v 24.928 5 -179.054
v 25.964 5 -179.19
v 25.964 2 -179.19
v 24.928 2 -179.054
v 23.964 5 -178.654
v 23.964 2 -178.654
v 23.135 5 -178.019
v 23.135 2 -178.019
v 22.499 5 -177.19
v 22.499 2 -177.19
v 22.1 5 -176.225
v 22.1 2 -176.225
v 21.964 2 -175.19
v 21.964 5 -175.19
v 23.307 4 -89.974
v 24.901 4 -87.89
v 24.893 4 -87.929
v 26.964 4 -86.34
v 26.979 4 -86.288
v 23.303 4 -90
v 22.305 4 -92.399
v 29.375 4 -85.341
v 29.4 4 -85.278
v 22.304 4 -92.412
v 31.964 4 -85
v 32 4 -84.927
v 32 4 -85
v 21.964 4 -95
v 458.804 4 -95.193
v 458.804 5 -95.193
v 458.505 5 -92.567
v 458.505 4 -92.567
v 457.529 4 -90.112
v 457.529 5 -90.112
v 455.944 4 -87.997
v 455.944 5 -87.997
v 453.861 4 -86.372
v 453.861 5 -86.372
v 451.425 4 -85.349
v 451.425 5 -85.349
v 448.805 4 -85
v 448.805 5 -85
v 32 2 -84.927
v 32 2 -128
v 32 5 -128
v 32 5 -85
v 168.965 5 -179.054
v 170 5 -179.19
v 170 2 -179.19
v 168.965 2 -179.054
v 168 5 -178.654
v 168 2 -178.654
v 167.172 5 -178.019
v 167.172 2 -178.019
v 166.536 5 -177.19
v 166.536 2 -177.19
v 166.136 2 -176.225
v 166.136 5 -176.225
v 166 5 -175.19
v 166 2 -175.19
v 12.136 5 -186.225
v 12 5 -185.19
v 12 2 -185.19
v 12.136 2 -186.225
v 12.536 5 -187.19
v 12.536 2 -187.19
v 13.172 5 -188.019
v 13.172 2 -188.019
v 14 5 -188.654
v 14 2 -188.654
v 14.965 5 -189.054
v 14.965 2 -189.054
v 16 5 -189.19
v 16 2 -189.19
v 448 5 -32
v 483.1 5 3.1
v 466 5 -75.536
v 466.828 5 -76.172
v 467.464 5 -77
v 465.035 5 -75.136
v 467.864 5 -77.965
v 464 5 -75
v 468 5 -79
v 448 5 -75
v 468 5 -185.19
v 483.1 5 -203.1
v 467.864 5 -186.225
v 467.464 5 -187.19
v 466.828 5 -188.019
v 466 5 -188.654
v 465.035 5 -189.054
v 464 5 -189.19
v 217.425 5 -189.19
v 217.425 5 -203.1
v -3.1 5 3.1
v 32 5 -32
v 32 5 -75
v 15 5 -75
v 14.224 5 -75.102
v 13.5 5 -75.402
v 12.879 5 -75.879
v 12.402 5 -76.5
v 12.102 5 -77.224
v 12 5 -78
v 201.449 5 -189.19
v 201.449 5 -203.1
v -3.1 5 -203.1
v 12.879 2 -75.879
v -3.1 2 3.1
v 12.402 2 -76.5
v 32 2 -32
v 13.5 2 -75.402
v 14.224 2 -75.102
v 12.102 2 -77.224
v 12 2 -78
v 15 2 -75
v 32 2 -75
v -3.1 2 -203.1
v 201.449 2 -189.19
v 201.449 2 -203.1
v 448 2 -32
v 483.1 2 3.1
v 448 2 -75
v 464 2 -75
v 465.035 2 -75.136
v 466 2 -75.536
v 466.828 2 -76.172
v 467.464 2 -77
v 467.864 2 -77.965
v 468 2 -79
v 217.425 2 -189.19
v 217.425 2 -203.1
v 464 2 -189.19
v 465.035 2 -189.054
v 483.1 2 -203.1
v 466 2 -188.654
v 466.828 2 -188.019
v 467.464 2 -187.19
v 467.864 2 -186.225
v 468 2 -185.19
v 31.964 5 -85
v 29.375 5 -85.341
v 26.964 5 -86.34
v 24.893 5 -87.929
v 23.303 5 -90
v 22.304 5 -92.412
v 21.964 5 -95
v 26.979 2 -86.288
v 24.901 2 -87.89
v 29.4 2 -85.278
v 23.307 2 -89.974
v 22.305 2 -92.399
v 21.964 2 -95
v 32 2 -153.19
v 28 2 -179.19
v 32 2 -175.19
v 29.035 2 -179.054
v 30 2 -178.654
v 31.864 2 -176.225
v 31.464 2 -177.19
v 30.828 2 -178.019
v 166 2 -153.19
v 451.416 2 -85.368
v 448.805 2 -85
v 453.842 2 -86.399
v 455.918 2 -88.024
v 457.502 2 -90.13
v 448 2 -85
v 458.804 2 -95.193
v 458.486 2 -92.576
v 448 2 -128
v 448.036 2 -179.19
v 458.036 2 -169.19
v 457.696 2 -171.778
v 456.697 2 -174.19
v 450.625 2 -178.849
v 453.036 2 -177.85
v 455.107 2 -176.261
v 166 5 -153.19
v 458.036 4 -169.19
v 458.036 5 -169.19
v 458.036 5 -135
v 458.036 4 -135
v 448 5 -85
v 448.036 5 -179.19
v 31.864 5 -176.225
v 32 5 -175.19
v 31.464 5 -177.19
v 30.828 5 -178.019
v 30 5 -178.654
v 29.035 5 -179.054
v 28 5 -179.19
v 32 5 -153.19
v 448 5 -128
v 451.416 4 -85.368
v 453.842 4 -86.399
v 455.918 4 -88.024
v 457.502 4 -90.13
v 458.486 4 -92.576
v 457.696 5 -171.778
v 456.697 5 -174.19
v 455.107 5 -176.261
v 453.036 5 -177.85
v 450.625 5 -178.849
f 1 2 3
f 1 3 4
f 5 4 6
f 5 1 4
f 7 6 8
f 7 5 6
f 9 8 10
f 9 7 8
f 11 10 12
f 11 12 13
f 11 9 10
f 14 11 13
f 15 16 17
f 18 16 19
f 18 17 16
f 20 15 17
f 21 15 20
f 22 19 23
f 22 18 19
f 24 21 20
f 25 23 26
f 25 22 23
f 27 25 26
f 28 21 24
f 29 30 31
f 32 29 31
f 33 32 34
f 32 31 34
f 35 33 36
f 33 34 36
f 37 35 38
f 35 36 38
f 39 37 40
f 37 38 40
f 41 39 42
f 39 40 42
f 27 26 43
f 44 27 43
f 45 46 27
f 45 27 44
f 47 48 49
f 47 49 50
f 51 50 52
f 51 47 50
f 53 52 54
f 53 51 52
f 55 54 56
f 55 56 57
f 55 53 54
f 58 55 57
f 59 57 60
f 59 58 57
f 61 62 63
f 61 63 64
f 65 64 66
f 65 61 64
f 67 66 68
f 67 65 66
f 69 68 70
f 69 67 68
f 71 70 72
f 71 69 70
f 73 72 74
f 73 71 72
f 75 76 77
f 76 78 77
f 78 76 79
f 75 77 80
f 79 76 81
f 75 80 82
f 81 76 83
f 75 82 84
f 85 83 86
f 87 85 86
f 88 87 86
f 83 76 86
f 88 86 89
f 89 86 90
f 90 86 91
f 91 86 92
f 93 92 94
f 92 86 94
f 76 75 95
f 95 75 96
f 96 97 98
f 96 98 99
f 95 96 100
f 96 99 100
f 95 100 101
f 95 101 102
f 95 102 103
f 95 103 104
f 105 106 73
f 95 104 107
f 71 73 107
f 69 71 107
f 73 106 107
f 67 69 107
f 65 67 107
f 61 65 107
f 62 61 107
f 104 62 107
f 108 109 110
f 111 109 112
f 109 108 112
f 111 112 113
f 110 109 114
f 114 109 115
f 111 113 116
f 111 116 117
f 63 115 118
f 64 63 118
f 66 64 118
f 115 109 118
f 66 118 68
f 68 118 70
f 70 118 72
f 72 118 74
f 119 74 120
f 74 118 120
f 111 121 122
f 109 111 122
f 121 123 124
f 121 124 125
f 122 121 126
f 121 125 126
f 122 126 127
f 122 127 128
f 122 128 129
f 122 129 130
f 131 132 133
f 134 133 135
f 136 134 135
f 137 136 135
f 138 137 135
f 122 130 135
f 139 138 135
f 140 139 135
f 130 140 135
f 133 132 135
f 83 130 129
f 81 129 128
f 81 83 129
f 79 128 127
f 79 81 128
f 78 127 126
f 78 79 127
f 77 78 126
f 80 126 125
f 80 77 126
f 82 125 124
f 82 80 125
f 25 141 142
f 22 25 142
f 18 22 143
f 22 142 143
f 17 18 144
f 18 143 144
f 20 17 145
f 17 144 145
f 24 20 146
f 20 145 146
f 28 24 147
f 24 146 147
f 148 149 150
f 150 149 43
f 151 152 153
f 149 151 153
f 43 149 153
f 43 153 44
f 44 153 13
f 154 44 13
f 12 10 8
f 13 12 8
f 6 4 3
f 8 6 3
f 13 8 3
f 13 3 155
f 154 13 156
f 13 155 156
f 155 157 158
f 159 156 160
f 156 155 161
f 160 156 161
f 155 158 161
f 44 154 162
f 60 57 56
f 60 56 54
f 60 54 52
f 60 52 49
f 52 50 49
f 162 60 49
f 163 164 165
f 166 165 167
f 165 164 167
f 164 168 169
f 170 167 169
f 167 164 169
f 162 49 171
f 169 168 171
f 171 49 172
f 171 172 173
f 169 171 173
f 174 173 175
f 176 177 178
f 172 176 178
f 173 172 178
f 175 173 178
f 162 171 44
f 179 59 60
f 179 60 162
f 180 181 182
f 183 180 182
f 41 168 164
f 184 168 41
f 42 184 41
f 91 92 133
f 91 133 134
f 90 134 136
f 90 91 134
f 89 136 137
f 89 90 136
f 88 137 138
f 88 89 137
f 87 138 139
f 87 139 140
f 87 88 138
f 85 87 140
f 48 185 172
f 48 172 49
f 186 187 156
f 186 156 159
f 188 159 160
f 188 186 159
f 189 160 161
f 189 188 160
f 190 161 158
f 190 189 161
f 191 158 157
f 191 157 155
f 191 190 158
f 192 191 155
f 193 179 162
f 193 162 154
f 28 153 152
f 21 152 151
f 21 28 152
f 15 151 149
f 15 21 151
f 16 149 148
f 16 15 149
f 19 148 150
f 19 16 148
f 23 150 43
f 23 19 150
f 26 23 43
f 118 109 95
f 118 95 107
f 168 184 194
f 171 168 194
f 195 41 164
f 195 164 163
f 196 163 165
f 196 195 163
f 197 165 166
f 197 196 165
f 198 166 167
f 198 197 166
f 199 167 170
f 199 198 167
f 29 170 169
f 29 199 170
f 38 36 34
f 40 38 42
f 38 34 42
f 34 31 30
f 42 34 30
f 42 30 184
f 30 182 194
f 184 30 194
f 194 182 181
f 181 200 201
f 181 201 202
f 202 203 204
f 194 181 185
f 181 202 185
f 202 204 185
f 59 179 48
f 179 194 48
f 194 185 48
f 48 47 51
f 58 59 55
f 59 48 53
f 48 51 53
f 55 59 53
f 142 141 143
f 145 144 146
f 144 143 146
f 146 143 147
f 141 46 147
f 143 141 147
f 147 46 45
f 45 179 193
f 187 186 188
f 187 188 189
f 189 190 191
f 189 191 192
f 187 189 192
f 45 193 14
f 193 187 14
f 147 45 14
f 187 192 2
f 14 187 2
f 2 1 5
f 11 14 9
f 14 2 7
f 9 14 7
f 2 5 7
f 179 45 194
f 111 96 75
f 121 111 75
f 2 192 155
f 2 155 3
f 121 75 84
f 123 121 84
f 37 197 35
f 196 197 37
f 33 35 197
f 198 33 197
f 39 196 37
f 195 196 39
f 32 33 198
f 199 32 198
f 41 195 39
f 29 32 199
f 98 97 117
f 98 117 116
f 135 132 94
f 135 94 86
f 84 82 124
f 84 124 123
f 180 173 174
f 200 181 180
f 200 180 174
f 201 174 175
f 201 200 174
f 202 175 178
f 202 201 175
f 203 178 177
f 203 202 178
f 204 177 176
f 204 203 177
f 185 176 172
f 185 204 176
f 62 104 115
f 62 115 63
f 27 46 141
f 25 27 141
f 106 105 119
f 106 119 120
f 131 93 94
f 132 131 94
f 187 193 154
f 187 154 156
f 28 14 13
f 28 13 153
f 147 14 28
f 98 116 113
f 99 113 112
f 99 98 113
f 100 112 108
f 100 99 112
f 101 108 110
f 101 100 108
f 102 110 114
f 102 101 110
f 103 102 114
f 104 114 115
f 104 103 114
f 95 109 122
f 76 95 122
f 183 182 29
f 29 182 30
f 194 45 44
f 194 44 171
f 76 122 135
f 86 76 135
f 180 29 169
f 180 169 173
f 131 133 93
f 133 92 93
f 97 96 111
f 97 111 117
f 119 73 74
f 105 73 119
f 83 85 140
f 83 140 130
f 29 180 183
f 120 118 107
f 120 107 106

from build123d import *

# Parameters (mm, degrees)
CROQUIS1_W              = 486.2
CROQUIS1_H              = 206.2
CROQUIS1_W_2            = 480
CROQUIS1_H_2            = 200
SALIENTE_EXTRUIR1_DEPTH = 12
CROQUIS3_W              = 486.2
CROQUIS3_H              = 206.2
CROQUIS3_W_2            = 480
CROQUIS3_H_2            = 200
CORTAR_EXTRUIR1_DEPTH   = 5
CORTAR_EXTRUIR3_DEPTH   = 8
CROQUIS4_W              = 20
CROQUIS4_H              = 6
CORTAR_EXTRUIR4_DEPTH   = 3
CORTAR_EXTRUIR5_DEPTH   = 2
CROQUIS7_W              = 721.947089947
CROQUIS7_H              = 359.419856831
CORTAR_EXTRUIR6_DEPTH   = 10
CROQUIS8_W              = 416
CROQUIS8_H              = 96
CORTAR_EXTRUIR7_DEPTH   = 10
CROQUIS9_W              = 531.904745737
CROQUIS9_H              = 246.353411826
CORTAR_EXTRUIR9_DEPTH   = 10
CROQUIS10_W             = 531.904745737
CROQUIS10_H             = 246.353411826
CORTAR_EXTRUIR10_DEPTH  = 10
CROQUIS11_W             = 531.904745737
CROQUIS11_H             = 246.353411826
CORTAR_EXTRUIR11_DEPTH  = 10


with BuildPart() as part:
    # Croquis1 → Saliente-Extruir1 (new body)
    with BuildSketch(Plane(origin=(0, 0, 0), x_dir=(1, 0, 0), z_dir=(0, 1, 0))):
        with Locations((240, 100)):
            Rectangle(CROQUIS1_W, CROQUIS1_H)
        with Locations((240, 100)):
            Rectangle(CROQUIS1_W_2, CROQUIS1_H_2, mode=Mode.SUBTRACT)
        with Locations((240, 100)):
            Rectangle(CROQUIS1_W_2, CROQUIS1_H_2)
    extrude(amount=SALIENTE_EXTRUIR1_DEPTH)

    # Croquis3 → Cortar-Extruir1 (cut)
    with BuildSketch(Plane(origin=(0, 12, 0), x_dir=(1, 0, 0), z_dir=(0, 1, 0))):
        with Locations((240, 100)):
            Rectangle(CROQUIS3_W, CROQUIS3_H)
        with Locations((240, 100)):
            Rectangle(CROQUIS3_W_2, CROQUIS3_H_2, mode=Mode.SUBTRACT)
    extrude(amount=-CORTAR_EXTRUIR1_DEPTH, mode=Mode.SUBTRACT)

    # Croquis2 → Cortar-Extruir3 (cut)
    with BuildSketch(Plane(origin=(0, 12, 0), x_dir=(1, 0, 0), z_dir=(0, 1, 0))):
        with BuildLine():
            ThreePointArc((16, 189.1902066), (13.171572875, 188.018633725), (12, 185.1902066))
            Line((12, 185.1902066), (12, 78))
            ThreePointArc((12, 78), (12.878679656, 75.878679656), (15, 75))
            Line((15, 75), (32, 75))
            Line((32, 75), (32, 32))
            Line((32, 32), (448, 32))
            Line((448, 32), (448, 75))
            Line((448, 75), (464, 75))
            ThreePointArc((464, 75), (466.828427125, 76.171572875), (468, 79))
            Line((468, 79), (468, 185.1902066))
            ThreePointArc((468, 185.1902066), (466.828427125, 188.018633725), (464, 189.1902066))
            Line((464, 189.1902066), (217.424703227, 189.1902066))
            Line((217.424703227, 189.1902066), (217.424703227, 203.1))
            Line((217.424703227, 203.1), (201.44869327, 203.1))
            Line((201.44869327, 203.1), (201.44869327, 189.1902066))
            Line((201.44869327, 189.1902066), (16, 189.1902066))
        make_face()
        with BuildLine():
            Line((32, 85), (31.963588191, 85))
            ThreePointArc((31.963588191, 85), (24.892520379, 87.928932188), (21.963588191, 95))
            Line((21.963588191, 95), (21.963588191, 175.1902066))
            ThreePointArc((21.963588191, 175.1902066), (23.135161066, 178.018633725), (25.963588191, 179.1902066))
            Line((25.963588191, 179.1902066), (28, 179.1902066))
            ThreePointArc((28, 179.1902066), (30.828427125, 178.018633725), (32, 175.1902066))
            Line((32, 175.1902066), (32, 153.1902066))
            Line((32, 153.1902066), (166, 153.1902066))
            Line((166, 153.1902066), (166, 175.1902066))
            ThreePointArc((166, 175.1902066), (167.171572875, 178.018633725), (170, 179.1902066))
            Line((170, 179.1902066), (448.036411809, 179.1902066))
            ThreePointArc((448.036411809, 179.1902066), (455.107479621, 176.261274412), (458.036411809, 169.1902066))
            Line((458.036411809, 169.1902066), (458.036411809, 135.000000034))
            Line((458.036411809, 135.000000034), (458.803569043, 95.19268186))
            ThreePointArc((458.803569043, 95.19268186), (455.944291637, 87.997386866), (448.80542553, 85))
            Line((448.80542553, 85), (448, 85))
            Line((448, 85), (448, 128))
            Line((448, 128), (32, 128))
            Line((32, 128), (32, 85))
        make_face(mode=Mode.SUBTRACT)
    extrude(amount=-CORTAR_EXTRUIR3_DEPTH, mode=Mode.SUBTRACT)

    # Croquis4 → Cortar-Extruir4 (cut)
    with BuildSketch(Plane(origin=(0, 12, 0), x_dir=(1, 0, 0), z_dir=(0, 1, 0))):
        with BuildLine():
            Line((31.963588191, 85), (32, 128))
            Line((32, 128), (32, 134))
            Line((32, 134), (32, 147.1902066))
            Line((32, 147.1902066), (32, 153.1902066))
            Line((32, 153.1902066), (32, 175.1902066))
            ThreePointArc((32, 175.1902066), (30.828427125, 178.018633725), (28, 179.1902066))
            Line((28, 179.1902066), (25.963588191, 179.1902066))
            ThreePointArc((25.963588191, 179.1902066), (23.135161066, 178.018633725), (21.963588191, 175.1902066))
            Line((21.963588191, 175.1902066), (21.963588191, 95))
            ThreePointArc((21.963588191, 95), (24.892520379, 87.928932188), (31.963588191, 85))
        make_face()
        with Locations((42, 131)):
            Rectangle(CROQUIS4_W, CROQUIS4_H)
        with Locations((42, 150.1902066)):
            Rectangle(CROQUIS4_W, CROQUIS4_H)
        with BuildLine():
            ThreePointArc((12, 78), (12.878679656, 75.878679656), (15, 75))
            Line((15, 75), (32, 75))
            Line((32, 75), (32, 69))
            Line((32, 69), (6, 69))
            Line((6, 69), (6, 80))
            Line((6, 80), (6, 195.1902066))
            Line((6, 195.1902066), (16, 195.1902066))
            Line((16, 195.1902066), (32, 195.1902066))
            Line((32, 195.1902066), (32, 189.1902066))
            Line((32, 189.1902066), (16, 189.1902066))
            ThreePointArc((16, 189.1902066), (13.171572875, 188.018633725), (12, 185.1902066))
            Line((12, 185.1902066), (12, 80))
            Line((12, 80), (12, 78))
        make_face()
        with Locations((42, 192.1902066)):
            Rectangle(CROQUIS4_W, CROQUIS4_H)
        with Locations((42, 29)):
            Rectangle(CROQUIS4_W, CROQUIS4_H)
        with Locations((156, 192.1902066)):
            Rectangle(CROQUIS4_W, CROQUIS4_H)
        with Locations((156, 150.1902066)):
            Rectangle(CROQUIS4_W, CROQUIS4_H)
        with BuildLine():
            Line((166, 147.1902066), (448, 147.1902066))
            Line((448, 147.1902066), (458.036411809, 147.1902066))
            Line((458.036411809, 147.1902066), (458.036411809, 169.1902066))
            ThreePointArc((458.036411809, 169.1902066), (455.107479621, 176.261274412), (448.036411809, 179.1902066))
            Line((448.036411809, 179.1902066), (170, 179.1902066))
            ThreePointArc((170, 179.1902066), (167.171572875, 178.018633725), (166, 175.1902066))
            Line((166, 175.1902066), (166, 153.1902066))
            Line((166, 153.1902066), (166, 147.1902066))
        make_face()
        with BuildLine():
            Line((458.036411809, 169.1902066), (458.036411809, 147.1902066))
            Line((458.036411809, 147.1902066), (474, 147.1902066))
            Line((474, 147.1902066), (474, 195.1902066))
            Line((474, 195.1902066), (166, 195.1902066))
            Line((166, 195.1902066), (166, 189.1902066))
            Line((166, 189.1902066), (166, 175.1902066))
            ThreePointArc((166, 175.1902066), (167.171572875, 178.018633725), (170, 179.1902066))
            Line((170, 179.1902066), (448.036411809, 179.1902066))
            ThreePointArc((448.036411809, 179.1902066), (455.107479621, 176.261274412), (458.036411809, 169.1902066))
        make_face()
        with BuildLine():
            Line((448.80542553, 85), (448, 85))
            Line((448, 85), (448, 69))
            Line((448, 69), (474, 69))
            Line((474, 69), (474, 147.1902066))
            Line((474, 147.1902066), (458.036411809, 147.1902066))
            Line((458.036411809, 147.1902066), (458.036411809, 135.000000034))
            Line((458.036411809, 135.000000034), (458.803569043, 95.19268186))
            ThreePointArc((458.803569043, 95.19268186), (455.944291637, 87.997386866), (448.80542553, 85))
        make_face()
        with Locations((438, 131)):
            Rectangle(CROQUIS4_W, CROQUIS4_H)
        with Locations((438, 29)):
            Rectangle(CROQUIS4_W, CROQUIS4_H)
        with BuildLine():
            Line((448, 134), (448, 128))
            Line((448, 128), (448, 85))
            Line((448, 85), (448.80542553, 85))
            ThreePointArc((448.80542553, 85), (455.944291637, 87.997386866), (458.803569043, 95.19268186))
            Line((458.803569043, 95.19268186), (458.036411809, 135.000000034))
            Line((458.036411809, 135.000000034), (458.036411809, 147.1902066))
            Line((458.036411809, 147.1902066), (448, 147.1902066))
            Line((448, 147.1902066), (448, 134))
        make_face()
    extrude(amount=-CORTAR_EXTRUIR4_DEPTH, mode=Mode.SUBTRACT)

    # Croquis5 → Cortar-Extruir5 (cut)
    with BuildSketch(Plane(origin=(0, 4, 0), x_dir=(1, 0, 0), z_dir=(0, 1, 0))):
        with BuildLine():
            Line((32.046028397, 84.926485337), (32, 75))
            Line((32, 75), (15, 75))
            ThreePointArc((15, 75), (12.878679656, 75.878679656), (12, 78))
            Line((12, 78), (12, 185.1902066))
            ThreePointArc((12, 185.1902066), (13.171572875, 188.018633725), (16, 189.1902066))
            Line((16, 189.1902066), (201.44869327, 189.1902066))
            Line((201.44869327, 189.1902066), (201.44869327, 203.1))
            Line((201.44869327, 203.1), (217.424703227, 203.1))
            Line((217.424703227, 203.1), (217.424703227, 189.1902066))
            Line((217.424703227, 189.1902066), (464, 189.1902066))
            ThreePointArc((464, 189.1902066), (466.828427125, 188.018633725), (468, 185.1902066))
            Line((468, 185.1902066), (468, 79))
            ThreePointArc((468, 79), (466.828427125, 76.171572875), (464, 75))
            Line((464, 75), (448, 75))
            Line((448, 75), (448, 85))
            Line((448, 85), (448.80542553, 85))
            ThreePointArc((448.80542553, 85), (455.917657262, 88.023512896), (458.803569043, 95.19268186))
            Line((458.803569043, 95.19268186), (458.036411809, 169.1902066))
            ThreePointArc((458.036411809, 169.1902066), (455.107479621, 176.261274412), (448.036411809, 179.1902066))
            Line((448.036411809, 179.1902066), (170, 179.1902066))
            ThreePointArc((170, 179.1902066), (167.171572875, 178.018633725), (166, 175.1902066))
            Line((166, 175.1902066), (166, 153.1902066))
            Line((166, 153.1902066), (32, 153.1902066))
            Line((32, 153.1902066), (32, 175.1902066))
            ThreePointArc((32, 175.1902066), (30.828427125, 178.018633725), (28, 179.1902066))
            Line((28, 179.1902066), (25.963588191, 179.1902066))
            ThreePointArc((25.963588191, 179.1902066), (23.135161066, 178.018633725), (21.963588191, 175.1902066))
            Line((21.963588191, 175.1902066), (21.963588191, 95))
            ThreePointArc((21.963588191, 95), (24.91720844, 87.873793117), (32.046028397, 84.926485337))
        make_face()
    extrude(amount=-CORTAR_EXTRUIR5_DEPTH, mode=Mode.SUBTRACT)

    # Croquis7 → Cortar-Extruir6 (cut)
    with BuildSketch(Plane(origin=(0, 2, 0), x_dir=(1, 0, 0), z_dir=(0, 1, 0))):
        with Locations((149.368191722, 161.470369199)):
            Rectangle(CROQUIS7_W, CROQUIS7_H)
    extrude(amount=-CORTAR_EXTRUIR6_DEPTH, mode=Mode.SUBTRACT)

    # Croquis8 → Cortar-Extruir7 (cut)
    with BuildSketch(Plane(origin=(0, 4, 0), x_dir=(1, 0, 0), z_dir=(0, 1, 0))):
        with Locations((240, 80)):
            Rectangle(CROQUIS8_W, CROQUIS8_H)
    extrude(amount=-CORTAR_EXTRUIR7_DEPTH, mode=Mode.SUBTRACT)


with BuildPart() as cortar_extruir7_piece_1:
    # of the separate pieces the step leaves, piece 1, a body of its own (cortar_extruir7_pieces)
    add(part.part.solids().sort_by_distance((483.1, 2, 3.1))[0])


with BuildPart() as cortar_extruir7_piece_2:
    # of the separate pieces the step leaves, piece 2, a body of its own (cortar_extruir7_pieces)
    add(part.part.solids().sort_by_distance((32, 2, -128))[0])


with BuildPart() as cortar_extruir9_tool:
    # Croquis9 → Cortar-Extruir9 (new body)
    with BuildSketch(Plane(origin=(0, 9, 0), x_dir=(1, 0, 0), z_dir=(0, 1, 0))):
        with Locations((247.004349215, 106.418772052)):
            Rectangle(CROQUIS9_W, CROQUIS9_H)
    extrude(amount=CORTAR_EXTRUIR9_DEPTH)


with BuildPart() as cortar_extruir7_piece_1_1:
    add(cortar_extruir7_piece_1.part)

    # Cortar-Extruir9: cut by cortar_extruir9_tool
    add(cortar_extruir9_tool.part, mode=Mode.SUBTRACT)


with BuildPart() as cortar_extruir7_piece_2_1:
    add(cortar_extruir7_piece_2.part)

    # Cortar-Extruir9: cut by cortar_extruir9_tool
    add(cortar_extruir9_tool.part, mode=Mode.SUBTRACT)


with BuildPart() as cortar_extruir10_tool:
    # Croquis10 → Cortar-Extruir10 (new body)
    with BuildSketch(Plane(origin=(0, 7, 0), x_dir=(1, 0, 0), z_dir=(0, 1, 0))):
        with Locations((247.004349215, 106.418772052)):
            Rectangle(CROQUIS10_W, CROQUIS10_H)
    extrude(amount=CORTAR_EXTRUIR10_DEPTH)


with BuildPart() as cortar_extruir7_piece_1_2:
    add(cortar_extruir7_piece_1_1.part)

    # Cortar-Extruir10: cut by cortar_extruir10_tool
    add(cortar_extruir10_tool.part, mode=Mode.SUBTRACT)


with BuildPart() as cortar_extruir7_piece_2_2:
    add(cortar_extruir7_piece_2_1.part)

    # Cortar-Extruir10: cut by cortar_extruir10_tool
    add(cortar_extruir10_tool.part, mode=Mode.SUBTRACT)


with BuildPart() as cortar_extruir11_tool:
    # Croquis11 → Cortar-Extruir11 (new body)
    with BuildSketch(Plane(origin=(0, 5, 0), x_dir=(-1, 0, 0), z_dir=(0, -1, 0))):
        with Locations((-247.004349215, 106.418772052)):
            Rectangle(CROQUIS11_W, CROQUIS11_H)
    extrude(amount=-CORTAR_EXTRUIR11_DEPTH)


with BuildPart() as cortar_extruir7_piece_1_3:
    add(cortar_extruir7_piece_1_2.part)

    # Cortar-Extruir11: cut by cortar_extruir11_tool
    add(cortar_extruir11_tool.part, mode=Mode.SUBTRACT)


with BuildPart() as cortar_extruir7_piece_2_3:
    add(cortar_extruir7_piece_2_2.part)

    # Cortar-Extruir11: cut by cortar_extruir11_tool
    add(cortar_extruir11_tool.part, mode=Mode.SUBTRACT)


solid = Compound([cortar_extruir7_piece_1_3.part, cortar_extruir7_piece_2_3.part])
